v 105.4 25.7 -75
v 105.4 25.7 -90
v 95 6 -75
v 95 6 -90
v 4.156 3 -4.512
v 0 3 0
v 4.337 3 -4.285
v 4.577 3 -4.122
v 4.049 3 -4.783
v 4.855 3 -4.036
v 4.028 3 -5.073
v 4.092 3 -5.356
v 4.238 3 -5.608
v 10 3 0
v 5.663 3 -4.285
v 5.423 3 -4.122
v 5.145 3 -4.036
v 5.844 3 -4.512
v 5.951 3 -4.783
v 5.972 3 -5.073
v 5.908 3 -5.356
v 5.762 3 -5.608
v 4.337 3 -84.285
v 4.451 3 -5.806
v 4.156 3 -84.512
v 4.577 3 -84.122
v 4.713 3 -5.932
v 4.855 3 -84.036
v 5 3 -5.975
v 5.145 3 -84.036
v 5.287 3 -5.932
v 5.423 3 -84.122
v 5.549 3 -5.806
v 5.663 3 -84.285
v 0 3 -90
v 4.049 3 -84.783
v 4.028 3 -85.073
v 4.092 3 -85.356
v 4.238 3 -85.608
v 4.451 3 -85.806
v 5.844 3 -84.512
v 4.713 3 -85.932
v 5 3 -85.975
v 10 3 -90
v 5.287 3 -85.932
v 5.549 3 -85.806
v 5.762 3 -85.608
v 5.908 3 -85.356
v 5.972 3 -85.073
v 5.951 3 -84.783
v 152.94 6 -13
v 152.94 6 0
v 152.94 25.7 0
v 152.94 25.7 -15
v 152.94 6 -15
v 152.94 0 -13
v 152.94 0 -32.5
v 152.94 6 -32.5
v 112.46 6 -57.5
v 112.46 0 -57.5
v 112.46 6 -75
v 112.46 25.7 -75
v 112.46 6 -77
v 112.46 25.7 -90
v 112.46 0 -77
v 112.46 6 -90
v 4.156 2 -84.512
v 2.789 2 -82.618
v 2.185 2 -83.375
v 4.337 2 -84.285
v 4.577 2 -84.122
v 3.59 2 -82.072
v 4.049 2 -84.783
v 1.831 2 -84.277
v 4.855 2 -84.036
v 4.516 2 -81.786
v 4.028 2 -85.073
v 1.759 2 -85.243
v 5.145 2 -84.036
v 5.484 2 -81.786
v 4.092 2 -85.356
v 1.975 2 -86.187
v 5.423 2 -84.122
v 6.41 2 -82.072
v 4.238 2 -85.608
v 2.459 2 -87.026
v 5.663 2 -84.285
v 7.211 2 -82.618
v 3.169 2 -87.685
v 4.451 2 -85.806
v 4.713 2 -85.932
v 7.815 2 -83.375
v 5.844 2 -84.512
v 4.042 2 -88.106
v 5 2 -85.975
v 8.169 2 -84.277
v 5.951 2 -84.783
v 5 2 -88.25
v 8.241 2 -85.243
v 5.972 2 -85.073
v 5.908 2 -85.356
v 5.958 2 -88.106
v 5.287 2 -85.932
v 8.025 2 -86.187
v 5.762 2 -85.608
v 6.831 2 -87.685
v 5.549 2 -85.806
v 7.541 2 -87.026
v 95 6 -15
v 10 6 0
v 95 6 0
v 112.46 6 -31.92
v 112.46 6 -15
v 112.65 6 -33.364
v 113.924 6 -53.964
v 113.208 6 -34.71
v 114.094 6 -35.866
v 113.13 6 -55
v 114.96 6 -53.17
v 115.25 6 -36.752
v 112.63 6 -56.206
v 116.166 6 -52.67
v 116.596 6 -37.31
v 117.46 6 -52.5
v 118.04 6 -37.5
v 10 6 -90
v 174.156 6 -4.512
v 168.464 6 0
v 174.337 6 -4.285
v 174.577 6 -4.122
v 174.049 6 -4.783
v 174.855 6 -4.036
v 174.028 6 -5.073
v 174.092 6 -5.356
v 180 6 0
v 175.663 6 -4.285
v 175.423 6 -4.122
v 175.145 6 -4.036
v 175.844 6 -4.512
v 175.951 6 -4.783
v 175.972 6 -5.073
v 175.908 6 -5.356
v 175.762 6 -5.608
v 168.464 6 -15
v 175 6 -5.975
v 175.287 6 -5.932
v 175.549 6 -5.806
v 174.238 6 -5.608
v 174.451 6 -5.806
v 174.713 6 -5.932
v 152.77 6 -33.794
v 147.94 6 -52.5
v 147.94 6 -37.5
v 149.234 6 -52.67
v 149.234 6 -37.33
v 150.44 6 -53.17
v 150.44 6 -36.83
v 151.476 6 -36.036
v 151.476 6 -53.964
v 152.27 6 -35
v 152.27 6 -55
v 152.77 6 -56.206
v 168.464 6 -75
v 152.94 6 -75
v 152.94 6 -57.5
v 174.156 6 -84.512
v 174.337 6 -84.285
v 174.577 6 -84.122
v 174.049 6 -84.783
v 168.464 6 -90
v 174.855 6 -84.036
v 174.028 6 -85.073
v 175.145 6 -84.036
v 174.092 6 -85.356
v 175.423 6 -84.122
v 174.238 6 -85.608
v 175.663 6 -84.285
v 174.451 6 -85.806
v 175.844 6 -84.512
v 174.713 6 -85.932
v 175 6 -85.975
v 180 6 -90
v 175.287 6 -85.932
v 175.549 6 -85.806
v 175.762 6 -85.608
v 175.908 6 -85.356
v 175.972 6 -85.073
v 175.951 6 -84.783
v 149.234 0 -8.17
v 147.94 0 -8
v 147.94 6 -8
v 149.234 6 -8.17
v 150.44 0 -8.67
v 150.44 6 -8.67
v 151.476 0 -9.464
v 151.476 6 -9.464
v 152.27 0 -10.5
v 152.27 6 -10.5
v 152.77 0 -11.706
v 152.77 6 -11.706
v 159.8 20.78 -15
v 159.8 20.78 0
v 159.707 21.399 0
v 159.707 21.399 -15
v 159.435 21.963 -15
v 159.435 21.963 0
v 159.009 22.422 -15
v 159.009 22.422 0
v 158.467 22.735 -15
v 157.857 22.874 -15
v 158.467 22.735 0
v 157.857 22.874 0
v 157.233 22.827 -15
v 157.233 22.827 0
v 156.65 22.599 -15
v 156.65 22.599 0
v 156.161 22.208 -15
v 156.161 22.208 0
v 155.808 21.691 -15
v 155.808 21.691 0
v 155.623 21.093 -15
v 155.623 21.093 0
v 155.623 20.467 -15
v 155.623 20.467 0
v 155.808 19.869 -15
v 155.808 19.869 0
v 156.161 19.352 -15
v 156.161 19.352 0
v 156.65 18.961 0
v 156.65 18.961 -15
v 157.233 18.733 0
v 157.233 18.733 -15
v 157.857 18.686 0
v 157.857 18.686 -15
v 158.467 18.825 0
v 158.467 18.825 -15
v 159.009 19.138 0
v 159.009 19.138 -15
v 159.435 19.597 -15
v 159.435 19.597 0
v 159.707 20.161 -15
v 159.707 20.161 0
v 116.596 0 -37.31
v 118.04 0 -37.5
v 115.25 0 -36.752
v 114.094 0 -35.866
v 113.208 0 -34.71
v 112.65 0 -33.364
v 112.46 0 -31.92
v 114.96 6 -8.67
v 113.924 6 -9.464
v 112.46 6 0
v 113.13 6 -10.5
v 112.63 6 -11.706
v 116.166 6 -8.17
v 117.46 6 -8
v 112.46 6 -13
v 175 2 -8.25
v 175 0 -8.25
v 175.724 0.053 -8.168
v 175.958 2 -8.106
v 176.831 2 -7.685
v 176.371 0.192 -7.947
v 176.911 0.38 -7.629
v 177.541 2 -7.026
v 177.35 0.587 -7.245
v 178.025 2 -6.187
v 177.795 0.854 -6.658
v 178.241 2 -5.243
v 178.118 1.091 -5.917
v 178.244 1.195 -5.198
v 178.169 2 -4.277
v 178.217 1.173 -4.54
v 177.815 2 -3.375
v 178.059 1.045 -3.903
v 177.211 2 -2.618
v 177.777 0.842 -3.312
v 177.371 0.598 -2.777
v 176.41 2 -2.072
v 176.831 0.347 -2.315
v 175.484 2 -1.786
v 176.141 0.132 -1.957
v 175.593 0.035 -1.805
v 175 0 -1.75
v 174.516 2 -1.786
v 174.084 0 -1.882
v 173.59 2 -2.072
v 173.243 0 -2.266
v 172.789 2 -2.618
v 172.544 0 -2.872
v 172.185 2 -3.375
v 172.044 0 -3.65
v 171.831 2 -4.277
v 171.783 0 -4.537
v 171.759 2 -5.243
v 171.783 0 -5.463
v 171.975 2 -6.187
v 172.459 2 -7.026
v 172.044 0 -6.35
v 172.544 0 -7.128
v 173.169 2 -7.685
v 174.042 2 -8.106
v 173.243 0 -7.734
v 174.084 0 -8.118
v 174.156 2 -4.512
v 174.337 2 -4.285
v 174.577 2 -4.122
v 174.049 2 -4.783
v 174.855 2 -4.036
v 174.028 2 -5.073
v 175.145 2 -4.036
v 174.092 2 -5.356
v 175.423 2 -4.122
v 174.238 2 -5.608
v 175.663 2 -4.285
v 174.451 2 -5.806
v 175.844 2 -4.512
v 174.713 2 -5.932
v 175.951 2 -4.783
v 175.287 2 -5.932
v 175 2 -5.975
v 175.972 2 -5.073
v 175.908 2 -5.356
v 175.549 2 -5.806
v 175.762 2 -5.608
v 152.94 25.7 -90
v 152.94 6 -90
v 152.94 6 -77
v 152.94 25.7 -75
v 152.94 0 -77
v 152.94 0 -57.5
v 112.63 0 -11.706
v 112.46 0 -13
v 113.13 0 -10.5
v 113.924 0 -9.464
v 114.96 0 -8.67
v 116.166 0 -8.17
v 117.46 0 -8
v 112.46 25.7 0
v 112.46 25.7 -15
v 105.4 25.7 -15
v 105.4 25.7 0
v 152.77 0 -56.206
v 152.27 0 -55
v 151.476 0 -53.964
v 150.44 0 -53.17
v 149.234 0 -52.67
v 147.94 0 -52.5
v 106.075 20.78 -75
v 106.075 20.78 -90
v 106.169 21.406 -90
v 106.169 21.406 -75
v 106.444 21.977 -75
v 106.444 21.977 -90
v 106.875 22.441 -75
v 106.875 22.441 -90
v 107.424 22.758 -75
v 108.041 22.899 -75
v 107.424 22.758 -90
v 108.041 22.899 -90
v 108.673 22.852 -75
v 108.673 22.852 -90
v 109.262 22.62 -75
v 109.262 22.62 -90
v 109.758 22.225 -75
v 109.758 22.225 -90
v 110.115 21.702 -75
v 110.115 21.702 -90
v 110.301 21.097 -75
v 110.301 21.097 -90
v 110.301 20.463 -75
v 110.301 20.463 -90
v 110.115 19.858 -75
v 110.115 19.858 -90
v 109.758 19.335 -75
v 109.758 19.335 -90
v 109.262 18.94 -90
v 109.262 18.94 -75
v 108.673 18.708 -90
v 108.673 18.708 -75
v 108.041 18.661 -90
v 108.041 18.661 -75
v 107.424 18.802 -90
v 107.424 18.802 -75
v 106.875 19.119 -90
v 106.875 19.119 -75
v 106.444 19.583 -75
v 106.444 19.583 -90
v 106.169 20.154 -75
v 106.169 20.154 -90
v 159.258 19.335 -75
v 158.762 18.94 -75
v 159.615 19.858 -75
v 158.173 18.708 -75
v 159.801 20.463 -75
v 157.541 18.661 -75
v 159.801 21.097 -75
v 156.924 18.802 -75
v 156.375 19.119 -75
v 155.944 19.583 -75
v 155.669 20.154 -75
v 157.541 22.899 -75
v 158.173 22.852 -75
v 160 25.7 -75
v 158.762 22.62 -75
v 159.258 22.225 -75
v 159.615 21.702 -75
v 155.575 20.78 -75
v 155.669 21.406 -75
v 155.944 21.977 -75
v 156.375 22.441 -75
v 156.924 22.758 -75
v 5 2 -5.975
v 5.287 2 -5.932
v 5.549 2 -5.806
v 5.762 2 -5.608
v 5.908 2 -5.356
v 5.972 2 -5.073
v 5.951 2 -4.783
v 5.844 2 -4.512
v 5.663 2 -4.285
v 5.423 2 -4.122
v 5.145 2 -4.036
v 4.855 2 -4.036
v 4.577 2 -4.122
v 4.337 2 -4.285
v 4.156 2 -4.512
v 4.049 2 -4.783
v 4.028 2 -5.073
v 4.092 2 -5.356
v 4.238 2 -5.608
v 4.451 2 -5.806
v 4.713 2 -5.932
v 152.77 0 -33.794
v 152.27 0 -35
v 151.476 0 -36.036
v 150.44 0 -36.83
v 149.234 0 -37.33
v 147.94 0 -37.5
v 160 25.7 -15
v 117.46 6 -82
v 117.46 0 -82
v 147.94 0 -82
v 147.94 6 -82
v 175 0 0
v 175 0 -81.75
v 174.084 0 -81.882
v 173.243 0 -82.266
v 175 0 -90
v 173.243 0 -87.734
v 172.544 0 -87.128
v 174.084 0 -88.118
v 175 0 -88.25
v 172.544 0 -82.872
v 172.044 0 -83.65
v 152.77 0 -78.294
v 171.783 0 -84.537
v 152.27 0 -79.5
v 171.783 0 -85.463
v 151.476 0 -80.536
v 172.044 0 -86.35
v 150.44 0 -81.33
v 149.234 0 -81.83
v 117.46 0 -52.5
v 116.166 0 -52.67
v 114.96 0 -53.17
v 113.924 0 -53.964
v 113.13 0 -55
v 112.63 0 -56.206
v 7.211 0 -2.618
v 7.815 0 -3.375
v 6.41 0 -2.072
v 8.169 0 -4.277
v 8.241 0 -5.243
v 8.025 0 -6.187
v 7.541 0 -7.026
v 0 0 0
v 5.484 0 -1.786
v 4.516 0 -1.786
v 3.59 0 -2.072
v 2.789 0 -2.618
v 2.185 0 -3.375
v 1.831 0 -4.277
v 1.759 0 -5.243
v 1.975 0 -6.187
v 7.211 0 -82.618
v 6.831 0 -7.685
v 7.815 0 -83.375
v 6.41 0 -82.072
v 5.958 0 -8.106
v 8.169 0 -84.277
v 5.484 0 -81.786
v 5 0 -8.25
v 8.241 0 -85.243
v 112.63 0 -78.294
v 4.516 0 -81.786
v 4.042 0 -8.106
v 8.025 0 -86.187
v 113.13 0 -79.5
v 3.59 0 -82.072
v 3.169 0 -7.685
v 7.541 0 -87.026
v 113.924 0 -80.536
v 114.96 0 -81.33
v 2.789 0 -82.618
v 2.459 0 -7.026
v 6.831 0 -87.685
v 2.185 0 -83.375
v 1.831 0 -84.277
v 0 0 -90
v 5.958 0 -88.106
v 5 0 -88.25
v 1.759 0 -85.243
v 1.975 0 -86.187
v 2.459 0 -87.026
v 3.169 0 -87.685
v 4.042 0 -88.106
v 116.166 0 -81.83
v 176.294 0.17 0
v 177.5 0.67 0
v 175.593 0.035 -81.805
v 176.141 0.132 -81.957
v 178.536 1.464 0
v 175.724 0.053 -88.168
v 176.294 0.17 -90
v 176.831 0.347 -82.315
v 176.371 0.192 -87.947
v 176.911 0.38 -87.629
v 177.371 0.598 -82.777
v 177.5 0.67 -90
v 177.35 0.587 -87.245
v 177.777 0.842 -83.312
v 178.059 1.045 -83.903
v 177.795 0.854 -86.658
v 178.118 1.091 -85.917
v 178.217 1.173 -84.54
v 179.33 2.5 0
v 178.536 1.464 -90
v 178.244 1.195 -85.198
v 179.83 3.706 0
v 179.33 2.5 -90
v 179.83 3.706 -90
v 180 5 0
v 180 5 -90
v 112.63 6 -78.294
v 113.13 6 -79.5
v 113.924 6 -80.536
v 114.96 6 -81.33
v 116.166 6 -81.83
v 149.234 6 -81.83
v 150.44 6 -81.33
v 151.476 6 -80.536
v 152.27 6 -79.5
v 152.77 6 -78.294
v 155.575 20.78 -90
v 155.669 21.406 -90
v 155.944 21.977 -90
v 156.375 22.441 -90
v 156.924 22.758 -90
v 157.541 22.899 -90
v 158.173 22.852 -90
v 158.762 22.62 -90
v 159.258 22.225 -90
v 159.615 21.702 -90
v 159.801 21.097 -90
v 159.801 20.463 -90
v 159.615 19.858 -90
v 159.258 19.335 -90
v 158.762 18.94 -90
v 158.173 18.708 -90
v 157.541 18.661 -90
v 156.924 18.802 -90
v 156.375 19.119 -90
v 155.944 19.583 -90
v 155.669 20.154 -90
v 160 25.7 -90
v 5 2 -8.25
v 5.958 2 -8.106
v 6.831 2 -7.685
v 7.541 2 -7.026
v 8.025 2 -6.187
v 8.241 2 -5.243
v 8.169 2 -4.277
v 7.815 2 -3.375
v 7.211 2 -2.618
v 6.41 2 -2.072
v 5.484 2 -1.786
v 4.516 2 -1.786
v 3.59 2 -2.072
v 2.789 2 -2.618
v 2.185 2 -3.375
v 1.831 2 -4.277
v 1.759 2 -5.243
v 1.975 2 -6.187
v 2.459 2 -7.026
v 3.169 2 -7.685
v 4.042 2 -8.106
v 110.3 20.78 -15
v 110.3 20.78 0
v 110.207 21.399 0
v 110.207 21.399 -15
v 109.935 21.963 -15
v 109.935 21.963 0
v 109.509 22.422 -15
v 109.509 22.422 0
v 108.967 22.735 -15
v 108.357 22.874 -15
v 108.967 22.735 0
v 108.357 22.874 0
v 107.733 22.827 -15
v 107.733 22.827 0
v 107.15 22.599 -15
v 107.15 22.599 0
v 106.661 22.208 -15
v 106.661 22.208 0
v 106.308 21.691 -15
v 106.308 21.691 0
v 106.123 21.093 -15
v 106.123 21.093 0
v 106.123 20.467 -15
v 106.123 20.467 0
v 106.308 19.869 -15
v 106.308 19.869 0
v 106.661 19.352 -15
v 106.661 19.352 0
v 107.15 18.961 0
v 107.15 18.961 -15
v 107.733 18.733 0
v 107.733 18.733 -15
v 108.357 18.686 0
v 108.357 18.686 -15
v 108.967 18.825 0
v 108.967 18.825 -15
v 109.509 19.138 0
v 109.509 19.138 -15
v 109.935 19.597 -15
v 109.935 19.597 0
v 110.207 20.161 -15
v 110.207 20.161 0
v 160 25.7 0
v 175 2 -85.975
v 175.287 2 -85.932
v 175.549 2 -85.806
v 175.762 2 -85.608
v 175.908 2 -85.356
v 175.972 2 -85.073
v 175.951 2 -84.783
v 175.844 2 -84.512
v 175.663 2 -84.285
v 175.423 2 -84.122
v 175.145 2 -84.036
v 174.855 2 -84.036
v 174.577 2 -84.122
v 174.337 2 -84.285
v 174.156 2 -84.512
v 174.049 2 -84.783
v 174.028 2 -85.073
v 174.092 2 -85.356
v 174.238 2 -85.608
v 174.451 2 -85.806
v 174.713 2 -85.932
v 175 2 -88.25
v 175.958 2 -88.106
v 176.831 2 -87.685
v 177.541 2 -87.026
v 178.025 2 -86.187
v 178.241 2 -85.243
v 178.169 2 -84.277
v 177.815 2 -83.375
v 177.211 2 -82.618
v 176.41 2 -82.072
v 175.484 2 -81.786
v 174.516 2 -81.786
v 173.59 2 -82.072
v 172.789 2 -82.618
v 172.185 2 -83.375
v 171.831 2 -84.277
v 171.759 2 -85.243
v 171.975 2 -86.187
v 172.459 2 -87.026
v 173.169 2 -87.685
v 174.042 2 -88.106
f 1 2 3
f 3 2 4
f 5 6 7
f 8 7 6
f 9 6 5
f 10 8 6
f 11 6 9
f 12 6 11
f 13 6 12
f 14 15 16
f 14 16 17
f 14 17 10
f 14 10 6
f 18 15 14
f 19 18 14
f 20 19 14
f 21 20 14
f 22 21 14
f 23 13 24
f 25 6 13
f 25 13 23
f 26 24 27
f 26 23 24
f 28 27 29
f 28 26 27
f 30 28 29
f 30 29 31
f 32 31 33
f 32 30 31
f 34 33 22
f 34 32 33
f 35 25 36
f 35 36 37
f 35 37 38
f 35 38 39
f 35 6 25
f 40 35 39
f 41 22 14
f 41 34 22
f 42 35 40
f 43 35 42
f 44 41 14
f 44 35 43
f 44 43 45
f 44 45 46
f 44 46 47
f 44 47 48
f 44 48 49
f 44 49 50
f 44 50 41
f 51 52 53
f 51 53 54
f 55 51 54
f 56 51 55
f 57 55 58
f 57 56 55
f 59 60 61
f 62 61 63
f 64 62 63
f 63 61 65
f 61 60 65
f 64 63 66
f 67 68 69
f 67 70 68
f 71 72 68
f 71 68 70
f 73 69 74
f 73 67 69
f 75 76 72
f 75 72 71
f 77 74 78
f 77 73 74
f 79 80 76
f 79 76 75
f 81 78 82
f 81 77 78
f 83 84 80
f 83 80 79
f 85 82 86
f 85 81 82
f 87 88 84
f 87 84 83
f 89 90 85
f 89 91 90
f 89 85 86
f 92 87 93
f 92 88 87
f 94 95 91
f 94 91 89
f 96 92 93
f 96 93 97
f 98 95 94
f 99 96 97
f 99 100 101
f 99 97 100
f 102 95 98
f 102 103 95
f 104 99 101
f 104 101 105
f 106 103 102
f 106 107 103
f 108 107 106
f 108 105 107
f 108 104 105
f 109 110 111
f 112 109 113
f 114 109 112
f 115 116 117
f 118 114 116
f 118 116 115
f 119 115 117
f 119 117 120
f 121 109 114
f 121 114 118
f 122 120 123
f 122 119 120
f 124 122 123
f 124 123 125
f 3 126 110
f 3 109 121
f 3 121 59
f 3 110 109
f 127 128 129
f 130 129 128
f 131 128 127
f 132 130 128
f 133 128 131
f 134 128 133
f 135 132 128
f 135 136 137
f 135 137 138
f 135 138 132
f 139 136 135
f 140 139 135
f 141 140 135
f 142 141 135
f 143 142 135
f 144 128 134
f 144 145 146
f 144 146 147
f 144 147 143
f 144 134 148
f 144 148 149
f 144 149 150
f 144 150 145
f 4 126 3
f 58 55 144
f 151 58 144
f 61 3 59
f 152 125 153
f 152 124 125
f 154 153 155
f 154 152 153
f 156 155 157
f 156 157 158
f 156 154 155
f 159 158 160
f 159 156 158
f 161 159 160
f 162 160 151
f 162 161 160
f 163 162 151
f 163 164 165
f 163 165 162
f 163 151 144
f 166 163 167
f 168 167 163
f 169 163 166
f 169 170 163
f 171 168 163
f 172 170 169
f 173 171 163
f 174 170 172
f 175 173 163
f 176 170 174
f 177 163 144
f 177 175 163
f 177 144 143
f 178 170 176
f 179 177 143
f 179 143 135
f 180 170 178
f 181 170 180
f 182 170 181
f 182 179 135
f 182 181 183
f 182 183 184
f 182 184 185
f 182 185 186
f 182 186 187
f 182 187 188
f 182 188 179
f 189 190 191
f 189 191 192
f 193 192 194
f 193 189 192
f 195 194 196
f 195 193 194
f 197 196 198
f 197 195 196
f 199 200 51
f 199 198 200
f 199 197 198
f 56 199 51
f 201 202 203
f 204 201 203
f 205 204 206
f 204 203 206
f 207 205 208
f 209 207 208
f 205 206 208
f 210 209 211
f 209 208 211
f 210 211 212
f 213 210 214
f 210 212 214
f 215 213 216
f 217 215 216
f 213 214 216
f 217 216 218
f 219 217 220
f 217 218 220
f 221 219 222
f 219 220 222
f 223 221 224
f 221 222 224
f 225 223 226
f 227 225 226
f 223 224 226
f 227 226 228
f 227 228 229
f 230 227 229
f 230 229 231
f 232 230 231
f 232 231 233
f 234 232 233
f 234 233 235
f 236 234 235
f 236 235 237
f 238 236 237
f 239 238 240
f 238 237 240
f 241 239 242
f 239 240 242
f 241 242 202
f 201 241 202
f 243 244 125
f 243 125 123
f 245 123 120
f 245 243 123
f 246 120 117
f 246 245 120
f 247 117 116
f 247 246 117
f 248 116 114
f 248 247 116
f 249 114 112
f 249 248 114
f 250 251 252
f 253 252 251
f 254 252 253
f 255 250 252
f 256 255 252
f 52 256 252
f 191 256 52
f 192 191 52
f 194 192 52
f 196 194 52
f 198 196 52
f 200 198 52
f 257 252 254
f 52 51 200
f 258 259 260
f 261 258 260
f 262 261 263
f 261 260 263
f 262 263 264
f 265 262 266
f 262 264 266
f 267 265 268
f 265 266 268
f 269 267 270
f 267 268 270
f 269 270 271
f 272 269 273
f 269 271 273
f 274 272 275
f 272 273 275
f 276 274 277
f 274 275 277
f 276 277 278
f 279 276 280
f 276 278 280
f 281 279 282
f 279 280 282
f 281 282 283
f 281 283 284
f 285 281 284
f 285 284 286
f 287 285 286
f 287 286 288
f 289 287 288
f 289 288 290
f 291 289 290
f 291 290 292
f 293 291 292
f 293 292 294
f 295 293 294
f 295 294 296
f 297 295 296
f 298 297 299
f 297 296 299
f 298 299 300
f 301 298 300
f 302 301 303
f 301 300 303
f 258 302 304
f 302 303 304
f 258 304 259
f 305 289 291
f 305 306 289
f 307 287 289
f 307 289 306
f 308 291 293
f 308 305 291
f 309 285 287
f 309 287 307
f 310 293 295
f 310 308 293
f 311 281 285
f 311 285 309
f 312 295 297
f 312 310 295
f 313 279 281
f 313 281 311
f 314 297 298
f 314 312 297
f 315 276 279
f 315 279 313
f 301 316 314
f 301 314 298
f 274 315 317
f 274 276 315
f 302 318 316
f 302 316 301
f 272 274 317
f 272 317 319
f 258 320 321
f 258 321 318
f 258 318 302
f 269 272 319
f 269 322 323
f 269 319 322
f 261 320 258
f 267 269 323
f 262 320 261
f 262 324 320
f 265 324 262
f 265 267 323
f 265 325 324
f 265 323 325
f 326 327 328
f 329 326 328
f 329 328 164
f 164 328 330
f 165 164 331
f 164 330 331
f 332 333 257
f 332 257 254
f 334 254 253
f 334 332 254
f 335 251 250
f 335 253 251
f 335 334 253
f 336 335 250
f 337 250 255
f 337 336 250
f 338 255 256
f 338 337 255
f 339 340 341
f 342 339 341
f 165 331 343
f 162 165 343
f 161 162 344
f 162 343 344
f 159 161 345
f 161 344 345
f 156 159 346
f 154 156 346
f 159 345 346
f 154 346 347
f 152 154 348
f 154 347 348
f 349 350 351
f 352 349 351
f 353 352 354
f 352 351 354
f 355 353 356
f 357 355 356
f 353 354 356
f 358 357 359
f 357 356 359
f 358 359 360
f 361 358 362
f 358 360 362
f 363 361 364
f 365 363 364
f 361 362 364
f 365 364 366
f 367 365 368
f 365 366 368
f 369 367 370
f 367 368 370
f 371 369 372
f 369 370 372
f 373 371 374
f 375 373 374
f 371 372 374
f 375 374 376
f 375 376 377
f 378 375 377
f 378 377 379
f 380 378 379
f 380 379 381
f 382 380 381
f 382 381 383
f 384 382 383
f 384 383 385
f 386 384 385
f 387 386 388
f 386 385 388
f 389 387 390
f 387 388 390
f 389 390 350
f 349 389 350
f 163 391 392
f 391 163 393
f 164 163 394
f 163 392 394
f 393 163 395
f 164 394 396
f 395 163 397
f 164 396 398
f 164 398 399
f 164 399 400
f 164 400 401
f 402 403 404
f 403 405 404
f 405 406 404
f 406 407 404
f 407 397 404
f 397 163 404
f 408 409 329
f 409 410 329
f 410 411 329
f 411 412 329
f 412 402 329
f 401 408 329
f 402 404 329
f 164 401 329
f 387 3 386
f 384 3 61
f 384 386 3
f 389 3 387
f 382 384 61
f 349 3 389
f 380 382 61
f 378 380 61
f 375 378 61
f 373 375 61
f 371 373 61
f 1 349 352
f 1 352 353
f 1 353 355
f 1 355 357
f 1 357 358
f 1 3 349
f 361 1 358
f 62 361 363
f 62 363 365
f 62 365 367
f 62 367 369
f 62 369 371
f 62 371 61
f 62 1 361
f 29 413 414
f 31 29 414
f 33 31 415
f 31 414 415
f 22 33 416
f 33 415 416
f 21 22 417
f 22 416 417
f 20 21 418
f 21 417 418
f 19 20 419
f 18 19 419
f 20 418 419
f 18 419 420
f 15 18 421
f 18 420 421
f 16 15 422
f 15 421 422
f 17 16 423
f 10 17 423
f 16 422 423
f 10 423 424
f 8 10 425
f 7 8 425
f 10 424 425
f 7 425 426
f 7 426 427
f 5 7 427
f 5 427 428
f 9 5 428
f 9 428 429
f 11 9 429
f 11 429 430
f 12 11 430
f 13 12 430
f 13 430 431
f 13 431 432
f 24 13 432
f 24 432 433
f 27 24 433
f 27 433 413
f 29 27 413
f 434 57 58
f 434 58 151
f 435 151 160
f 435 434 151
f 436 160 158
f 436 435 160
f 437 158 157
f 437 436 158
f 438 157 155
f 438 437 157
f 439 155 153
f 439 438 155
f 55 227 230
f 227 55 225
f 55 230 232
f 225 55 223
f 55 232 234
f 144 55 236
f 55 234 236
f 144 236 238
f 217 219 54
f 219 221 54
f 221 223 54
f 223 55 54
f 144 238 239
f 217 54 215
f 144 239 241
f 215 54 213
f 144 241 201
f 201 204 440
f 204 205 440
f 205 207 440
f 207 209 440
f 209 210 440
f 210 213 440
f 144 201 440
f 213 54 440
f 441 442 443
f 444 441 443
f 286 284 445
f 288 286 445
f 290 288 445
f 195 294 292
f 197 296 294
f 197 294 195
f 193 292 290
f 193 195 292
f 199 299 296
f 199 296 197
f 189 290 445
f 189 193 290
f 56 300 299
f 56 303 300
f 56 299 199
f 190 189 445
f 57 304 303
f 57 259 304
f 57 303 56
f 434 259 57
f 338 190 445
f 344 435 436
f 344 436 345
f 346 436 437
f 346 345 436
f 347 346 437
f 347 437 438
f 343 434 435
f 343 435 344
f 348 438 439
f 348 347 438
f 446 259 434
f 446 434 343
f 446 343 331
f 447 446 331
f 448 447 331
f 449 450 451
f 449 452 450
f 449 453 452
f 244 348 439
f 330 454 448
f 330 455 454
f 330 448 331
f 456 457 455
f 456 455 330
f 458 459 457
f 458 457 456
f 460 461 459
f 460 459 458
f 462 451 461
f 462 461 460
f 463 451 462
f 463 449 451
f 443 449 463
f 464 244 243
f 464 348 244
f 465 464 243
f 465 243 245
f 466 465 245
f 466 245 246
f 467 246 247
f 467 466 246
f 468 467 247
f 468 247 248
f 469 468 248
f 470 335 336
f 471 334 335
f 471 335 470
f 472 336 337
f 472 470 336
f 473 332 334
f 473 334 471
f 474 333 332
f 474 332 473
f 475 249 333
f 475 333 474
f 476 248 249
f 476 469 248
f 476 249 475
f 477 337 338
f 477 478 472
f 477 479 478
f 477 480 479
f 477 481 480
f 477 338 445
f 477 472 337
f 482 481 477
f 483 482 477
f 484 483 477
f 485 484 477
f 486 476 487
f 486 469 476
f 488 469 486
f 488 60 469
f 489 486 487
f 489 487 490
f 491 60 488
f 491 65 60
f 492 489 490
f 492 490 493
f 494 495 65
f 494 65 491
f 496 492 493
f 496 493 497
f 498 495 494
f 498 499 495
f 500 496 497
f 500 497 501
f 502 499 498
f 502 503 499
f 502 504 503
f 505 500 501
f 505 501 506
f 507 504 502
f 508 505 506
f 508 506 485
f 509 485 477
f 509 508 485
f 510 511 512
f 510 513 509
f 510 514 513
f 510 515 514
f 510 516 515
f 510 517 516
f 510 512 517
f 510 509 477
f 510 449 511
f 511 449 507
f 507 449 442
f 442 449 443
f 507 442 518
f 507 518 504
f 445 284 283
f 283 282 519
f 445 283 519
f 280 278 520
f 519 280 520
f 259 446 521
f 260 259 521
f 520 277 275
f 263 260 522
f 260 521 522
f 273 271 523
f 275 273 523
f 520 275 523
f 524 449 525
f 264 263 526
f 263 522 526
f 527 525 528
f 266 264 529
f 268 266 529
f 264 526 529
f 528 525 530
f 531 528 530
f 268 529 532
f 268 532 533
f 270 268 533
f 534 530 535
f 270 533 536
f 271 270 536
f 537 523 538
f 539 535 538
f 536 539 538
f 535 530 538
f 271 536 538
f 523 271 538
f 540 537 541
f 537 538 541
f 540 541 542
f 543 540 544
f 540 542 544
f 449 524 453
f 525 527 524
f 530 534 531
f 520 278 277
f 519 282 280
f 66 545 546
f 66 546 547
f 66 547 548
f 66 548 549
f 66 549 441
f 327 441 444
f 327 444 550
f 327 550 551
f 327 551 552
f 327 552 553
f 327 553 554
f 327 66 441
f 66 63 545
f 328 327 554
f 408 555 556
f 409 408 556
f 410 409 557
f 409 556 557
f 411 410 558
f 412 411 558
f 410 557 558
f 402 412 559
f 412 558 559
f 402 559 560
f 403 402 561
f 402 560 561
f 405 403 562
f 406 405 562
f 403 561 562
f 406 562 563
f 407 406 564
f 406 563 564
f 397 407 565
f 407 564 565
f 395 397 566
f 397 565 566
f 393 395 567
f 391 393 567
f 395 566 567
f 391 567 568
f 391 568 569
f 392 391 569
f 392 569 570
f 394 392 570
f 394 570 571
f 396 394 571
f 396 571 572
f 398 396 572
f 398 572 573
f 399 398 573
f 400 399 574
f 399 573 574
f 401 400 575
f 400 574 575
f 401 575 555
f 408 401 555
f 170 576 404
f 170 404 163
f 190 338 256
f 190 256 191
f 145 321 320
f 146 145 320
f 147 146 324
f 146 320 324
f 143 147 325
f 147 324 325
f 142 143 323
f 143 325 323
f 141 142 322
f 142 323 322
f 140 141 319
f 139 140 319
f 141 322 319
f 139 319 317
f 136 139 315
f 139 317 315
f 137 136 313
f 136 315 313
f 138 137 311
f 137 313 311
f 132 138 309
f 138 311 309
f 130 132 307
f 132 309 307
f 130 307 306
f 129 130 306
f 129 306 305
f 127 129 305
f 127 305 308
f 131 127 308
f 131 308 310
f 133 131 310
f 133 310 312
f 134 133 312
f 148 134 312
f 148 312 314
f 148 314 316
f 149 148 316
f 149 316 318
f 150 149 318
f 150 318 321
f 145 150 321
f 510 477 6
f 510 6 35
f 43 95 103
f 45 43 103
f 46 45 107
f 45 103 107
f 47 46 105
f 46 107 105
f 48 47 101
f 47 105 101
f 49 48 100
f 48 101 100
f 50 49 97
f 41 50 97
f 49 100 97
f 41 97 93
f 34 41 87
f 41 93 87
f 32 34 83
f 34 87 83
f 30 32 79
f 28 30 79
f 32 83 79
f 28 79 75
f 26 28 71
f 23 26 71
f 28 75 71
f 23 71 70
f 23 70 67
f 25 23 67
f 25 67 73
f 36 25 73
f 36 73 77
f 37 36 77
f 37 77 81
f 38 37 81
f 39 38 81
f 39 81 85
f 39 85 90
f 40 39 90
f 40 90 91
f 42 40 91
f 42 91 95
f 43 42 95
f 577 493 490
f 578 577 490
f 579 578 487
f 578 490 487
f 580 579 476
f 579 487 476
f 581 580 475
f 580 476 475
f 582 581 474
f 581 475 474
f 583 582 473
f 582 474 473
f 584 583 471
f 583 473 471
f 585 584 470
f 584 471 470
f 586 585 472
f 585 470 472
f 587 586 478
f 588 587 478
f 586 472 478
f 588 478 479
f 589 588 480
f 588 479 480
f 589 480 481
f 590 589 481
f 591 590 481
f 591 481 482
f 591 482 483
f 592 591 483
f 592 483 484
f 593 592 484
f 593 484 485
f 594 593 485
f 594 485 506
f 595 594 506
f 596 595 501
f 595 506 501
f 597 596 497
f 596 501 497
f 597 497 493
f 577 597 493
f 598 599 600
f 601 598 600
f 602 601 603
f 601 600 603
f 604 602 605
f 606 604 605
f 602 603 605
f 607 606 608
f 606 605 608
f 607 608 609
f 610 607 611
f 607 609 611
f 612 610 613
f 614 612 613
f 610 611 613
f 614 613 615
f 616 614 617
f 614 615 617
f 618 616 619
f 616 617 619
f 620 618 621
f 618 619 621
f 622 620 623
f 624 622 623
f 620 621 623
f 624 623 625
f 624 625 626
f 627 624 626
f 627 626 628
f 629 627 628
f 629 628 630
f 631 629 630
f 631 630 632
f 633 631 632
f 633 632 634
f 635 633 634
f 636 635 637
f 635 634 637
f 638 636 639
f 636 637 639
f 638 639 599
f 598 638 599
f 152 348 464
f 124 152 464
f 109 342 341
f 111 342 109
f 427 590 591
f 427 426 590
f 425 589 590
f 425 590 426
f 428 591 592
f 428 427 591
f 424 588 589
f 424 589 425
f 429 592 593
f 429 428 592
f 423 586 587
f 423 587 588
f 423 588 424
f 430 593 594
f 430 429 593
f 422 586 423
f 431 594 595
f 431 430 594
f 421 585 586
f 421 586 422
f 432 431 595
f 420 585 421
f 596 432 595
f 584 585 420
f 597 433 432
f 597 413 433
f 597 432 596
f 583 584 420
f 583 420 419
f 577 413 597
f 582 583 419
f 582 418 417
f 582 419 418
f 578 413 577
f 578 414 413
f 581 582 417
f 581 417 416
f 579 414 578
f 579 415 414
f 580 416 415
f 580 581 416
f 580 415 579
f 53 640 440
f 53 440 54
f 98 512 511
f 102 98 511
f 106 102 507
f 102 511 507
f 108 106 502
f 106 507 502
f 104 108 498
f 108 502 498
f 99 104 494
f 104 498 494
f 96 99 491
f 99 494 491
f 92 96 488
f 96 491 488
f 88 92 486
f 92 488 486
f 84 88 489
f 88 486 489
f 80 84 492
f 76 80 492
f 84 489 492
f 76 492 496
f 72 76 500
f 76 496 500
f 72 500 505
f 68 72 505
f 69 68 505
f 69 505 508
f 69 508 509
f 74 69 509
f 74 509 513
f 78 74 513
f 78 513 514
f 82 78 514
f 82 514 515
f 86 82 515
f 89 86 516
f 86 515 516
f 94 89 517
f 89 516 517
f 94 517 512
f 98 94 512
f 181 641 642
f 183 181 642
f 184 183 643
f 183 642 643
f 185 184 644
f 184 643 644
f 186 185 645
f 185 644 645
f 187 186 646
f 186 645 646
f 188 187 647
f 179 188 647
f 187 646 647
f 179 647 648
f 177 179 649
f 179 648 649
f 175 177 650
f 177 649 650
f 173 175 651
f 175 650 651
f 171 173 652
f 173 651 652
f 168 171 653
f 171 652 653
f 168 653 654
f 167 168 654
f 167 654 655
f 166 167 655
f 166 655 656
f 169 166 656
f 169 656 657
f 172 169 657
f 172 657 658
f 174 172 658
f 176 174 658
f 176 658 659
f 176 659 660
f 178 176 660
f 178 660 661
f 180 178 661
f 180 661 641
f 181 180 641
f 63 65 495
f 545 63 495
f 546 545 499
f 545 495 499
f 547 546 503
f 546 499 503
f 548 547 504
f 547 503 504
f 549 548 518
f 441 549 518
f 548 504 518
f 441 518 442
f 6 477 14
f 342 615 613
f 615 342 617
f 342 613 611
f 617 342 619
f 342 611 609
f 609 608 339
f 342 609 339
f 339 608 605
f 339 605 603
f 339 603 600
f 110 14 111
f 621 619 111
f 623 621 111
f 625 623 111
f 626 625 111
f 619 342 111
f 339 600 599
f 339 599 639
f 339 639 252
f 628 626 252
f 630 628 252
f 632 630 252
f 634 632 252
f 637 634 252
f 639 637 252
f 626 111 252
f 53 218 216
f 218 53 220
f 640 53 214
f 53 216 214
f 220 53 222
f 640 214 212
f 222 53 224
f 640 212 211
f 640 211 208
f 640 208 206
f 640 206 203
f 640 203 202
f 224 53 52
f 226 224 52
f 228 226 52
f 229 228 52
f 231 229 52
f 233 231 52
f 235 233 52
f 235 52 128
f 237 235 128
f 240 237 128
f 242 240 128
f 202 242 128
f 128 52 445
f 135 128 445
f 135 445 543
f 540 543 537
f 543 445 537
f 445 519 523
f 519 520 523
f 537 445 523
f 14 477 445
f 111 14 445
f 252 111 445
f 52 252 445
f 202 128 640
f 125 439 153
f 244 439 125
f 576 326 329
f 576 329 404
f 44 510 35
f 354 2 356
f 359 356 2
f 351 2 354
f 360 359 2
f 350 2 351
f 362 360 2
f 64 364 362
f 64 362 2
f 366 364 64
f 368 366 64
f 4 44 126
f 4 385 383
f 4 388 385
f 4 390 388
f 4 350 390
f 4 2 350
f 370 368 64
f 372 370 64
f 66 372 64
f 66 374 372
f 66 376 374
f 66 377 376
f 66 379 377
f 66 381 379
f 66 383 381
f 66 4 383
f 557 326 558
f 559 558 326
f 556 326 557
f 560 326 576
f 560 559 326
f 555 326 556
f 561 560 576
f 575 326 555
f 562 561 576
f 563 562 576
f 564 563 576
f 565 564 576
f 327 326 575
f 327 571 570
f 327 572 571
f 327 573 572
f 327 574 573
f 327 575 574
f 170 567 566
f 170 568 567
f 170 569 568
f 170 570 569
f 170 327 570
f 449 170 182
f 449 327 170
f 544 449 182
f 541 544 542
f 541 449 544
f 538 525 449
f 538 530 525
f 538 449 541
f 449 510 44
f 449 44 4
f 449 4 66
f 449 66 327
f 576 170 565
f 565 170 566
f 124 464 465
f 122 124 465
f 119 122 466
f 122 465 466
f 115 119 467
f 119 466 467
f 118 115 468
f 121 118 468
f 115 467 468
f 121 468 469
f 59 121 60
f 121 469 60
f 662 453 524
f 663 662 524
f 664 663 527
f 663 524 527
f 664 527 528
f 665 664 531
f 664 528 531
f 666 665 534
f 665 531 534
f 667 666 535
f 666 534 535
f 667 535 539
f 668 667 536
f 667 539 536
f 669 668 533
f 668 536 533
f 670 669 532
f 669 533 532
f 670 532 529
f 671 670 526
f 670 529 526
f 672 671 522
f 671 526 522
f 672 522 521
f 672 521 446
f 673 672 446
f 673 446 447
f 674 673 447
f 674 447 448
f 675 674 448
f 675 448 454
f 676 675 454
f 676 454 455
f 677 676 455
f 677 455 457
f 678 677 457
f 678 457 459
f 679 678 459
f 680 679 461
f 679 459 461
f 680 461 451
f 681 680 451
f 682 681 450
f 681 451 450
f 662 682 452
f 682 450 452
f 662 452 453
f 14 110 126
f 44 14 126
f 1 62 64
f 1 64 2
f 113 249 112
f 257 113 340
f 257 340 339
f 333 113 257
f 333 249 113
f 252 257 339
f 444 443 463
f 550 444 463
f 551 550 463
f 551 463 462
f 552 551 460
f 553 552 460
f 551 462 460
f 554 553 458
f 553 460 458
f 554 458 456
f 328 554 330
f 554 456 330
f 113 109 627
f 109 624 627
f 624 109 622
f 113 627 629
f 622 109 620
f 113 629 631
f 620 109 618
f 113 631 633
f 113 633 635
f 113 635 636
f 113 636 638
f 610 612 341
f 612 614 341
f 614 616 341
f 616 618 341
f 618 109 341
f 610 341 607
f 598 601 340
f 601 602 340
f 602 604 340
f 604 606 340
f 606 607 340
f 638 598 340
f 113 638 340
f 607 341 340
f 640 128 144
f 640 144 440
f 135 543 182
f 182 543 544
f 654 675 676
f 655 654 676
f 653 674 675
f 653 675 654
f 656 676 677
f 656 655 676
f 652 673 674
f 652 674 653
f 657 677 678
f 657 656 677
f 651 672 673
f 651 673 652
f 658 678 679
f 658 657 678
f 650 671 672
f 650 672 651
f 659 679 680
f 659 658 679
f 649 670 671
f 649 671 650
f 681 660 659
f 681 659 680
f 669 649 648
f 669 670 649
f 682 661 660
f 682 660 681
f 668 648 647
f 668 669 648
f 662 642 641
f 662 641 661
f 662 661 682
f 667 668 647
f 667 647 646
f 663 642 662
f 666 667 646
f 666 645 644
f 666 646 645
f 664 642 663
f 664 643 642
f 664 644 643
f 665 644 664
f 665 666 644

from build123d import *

# Parameters (mm, degrees)
SKIZZE2_W                       = 180
SKIZZE2_H                       = 90
AUFSATZ_LINEAR_AUSTRAGEN1_DEPTH = 6
SKIZZE3_W                       = 10
SKIZZE3_H                       = 90
SCHNITT_LINEAR_AUSTRAGEN1_DEPTH = 3
SKIZZE4_R                       = 2.125
AUFSATZ_LINEAR_AUSTRAGEN2_DEPTH = 15
SKIZZE5_R                       = 2.1
AUFSATZ_LINEAR_AUSTRAGEN3_DEPTH = 15
VERRUNDUNG1_R                   = 5
SCHNITT_LINEAR_AUSTRAGEN2_DEPTH = 10
SKIZZE7_R                       = 0.975
SCHNITT_LINEAR_AUSTRAGEN3_DEPTH = 10
SKIZZE8_R                       = 3.25
SCHNITT_LINEAR_AUSTRAGEN4_DEPTH = 2


with BuildPart() as part:
    # Skizze2 → Aufsatz-Linear austragen1 (new body)
    with BuildSketch(Plane(origin=(0, 0, 0), x_dir=(1, 0, 0), z_dir=(0, 1, 0))):
        with Locations((90, 45)):
            Rectangle(SKIZZE2_W, SKIZZE2_H)
    extrude(amount=AUFSATZ_LINEAR_AUSTRAGEN1_DEPTH)

    # Skizze3 → Schnitt-Linear austragen1 (cut)
    with BuildSketch(Plane(origin=(0, 6, 0), x_dir=(1, 0, 0), z_dir=(0, 1, 0))):
        with Locations((5, 45)):
            Rectangle(SKIZZE3_W, SKIZZE3_H)
    extrude(amount=-SCHNITT_LINEAR_AUSTRAGEN1_DEPTH, mode=Mode.SUBTRACT)

    # Skizze4 → Aufsatz-Linear austragen2 (add)
    # profile 1 of 2: a face of its own
    with BuildSketch(Plane(origin=(0, 0, -90), x_dir=(-1, 0, 0), z_dir=(0, 0, -1))):
        Polygon((-160, 0), (-152.94, 0), (-152.94, 25.7), (-160, 25.7), (-168.464332067, 6), (-160, 6), align=None)
        with Locations((-157.7, 20.78)):
            Circle(SKIZZE4_R, mode=Mode.SUBTRACT)
    # profile 2 of 2: a face of its own
    with BuildSketch(Plane(origin=(0, 0, -90), x_dir=(-1, 0, 0), z_dir=(0, 0, -1))):
        Polygon((-105.4, 25.7), (-95, 6), (-105.4, 6), (-105.4, 0), (-112.46, 0), (-112.46, 25.7), align=None)
        with Locations((-108.2, 20.78)):
            Circle(SKIZZE4_R, mode=Mode.SUBTRACT)
    extrude(amount=-AUFSATZ_LINEAR_AUSTRAGEN2_DEPTH)

    # Skizze5 → Aufsatz-Linear austragen3 (add)
    # profile 1 of 2: a face of its own
    with BuildSketch(Plane.XY):
        Polygon((105.4, 25.7), (95, 6), (105.4, 6), (112.46, 6), (112.46, 25.7), align=None)
        with Locations((108.2, 20.78)):
            Circle(SKIZZE5_R, mode=Mode.SUBTRACT)
    # profile 2 of 2: a face of its own
    with BuildSketch(Plane.XY):
        Polygon((160, 25.7), (152.94, 25.7), (152.94, 6), (160, 6), (168.464332067, 6), align=None)
        with Locations((157.7, 20.78)):
            Circle(SKIZZE5_R, mode=Mode.SUBTRACT)
    extrude(amount=-AUFSATZ_LINEAR_AUSTRAGEN3_DEPTH)

    # Verrundung1
    verrundung1_edges = [part.edges().sort_by_distance(p)[0] for p in [
        (180, 0, -45),
    ]]
    fillet(verrundung1_edges, radius=VERRUNDUNG1_R)

    # Skizze6 → Schnitt-Linear austragen2 (cut)
    with BuildSketch(Plane(origin=(0, 0, 0), x_dir=(-1, 0, 0), z_dir=(0, -1, 0))):
        with BuildLine():
            Line((-117.46, 8), (-147.94, 8))
            ThreePointArc((-147.94, 8), (-151.475533906, 9.464466094), (-152.94, 13))
            Line((-152.94, 13), (-152.94, 32.5))
            ThreePointArc((-152.94, 32.5), (-151.475533906, 36.035533906), (-147.94, 37.5))
            Line((-147.94, 37.5), (-132.970987797, 37.5))
            Line((-132.970987797, 37.5), (-118.04, 37.5))
            ThreePointArc((-118.04, 37.5), (-114.094344161, 35.865655839), (-112.46, 31.92))
            Line((-112.46, 31.92), (-112.46, 13))
            ThreePointArc((-112.46, 13), (-113.924466094, 9.464466094), (-117.46, 8))
        make_face()
        with BuildLine():
            Line((-117.46, 82), (-147.94, 82))
            ThreePointArc((-147.94, 82), (-151.475533906, 80.535533906), (-152.94, 77))
            Line((-152.94, 77), (-152.94, 57.5))
            ThreePointArc((-152.94, 57.5), (-151.475533906, 53.964466094), (-147.94, 52.5))
            Line((-147.94, 52.5), (-117.46, 52.5))
            ThreePointArc((-117.46, 52.5), (-113.924466094, 53.964466094), (-112.46, 57.5))
            Line((-112.46, 57.5), (-112.46, 77))
            ThreePointArc((-112.46, 77), (-113.924466094, 80.535533906), (-117.46, 82))
        make_face()
    extrude(amount=-SCHNITT_LINEAR_AUSTRAGEN2_DEPTH, mode=Mode.SUBTRACT)

    # Skizze7 → Schnitt-Linear austragen3 (cut)
    with BuildSketch(Plane.XZ):
        with Locations((5, -5)):
            Circle(SKIZZE7_R)
        with Locations((5, -85)):
            Circle(SKIZZE7_R)
        with Locations((175, -85)):
            Circle(SKIZZE7_R)
        with Locations((175, -5)):
            Circle(SKIZZE7_R)
    extrude(amount=-SCHNITT_LINEAR_AUSTRAGEN3_DEPTH, mode=Mode.SUBTRACT)

    # Skizze8 → Schnitt-Linear austragen4 (cut)
    with BuildSketch(Plane.XZ):
        with Locations((5, -5)):
            Circle(SKIZZE8_R)
        with Locations((5, -85)):
            Circle(SKIZZE8_R)
        with Locations((175, -85)):
            Circle(SKIZZE8_R)
        with Locations((175, -5)):
            Circle(SKIZZE8_R)
    extrude(amount=-SCHNITT_LINEAR_AUSTRAGEN4_DEPTH, mode=Mode.SUBTRACT)


solid = part.part
